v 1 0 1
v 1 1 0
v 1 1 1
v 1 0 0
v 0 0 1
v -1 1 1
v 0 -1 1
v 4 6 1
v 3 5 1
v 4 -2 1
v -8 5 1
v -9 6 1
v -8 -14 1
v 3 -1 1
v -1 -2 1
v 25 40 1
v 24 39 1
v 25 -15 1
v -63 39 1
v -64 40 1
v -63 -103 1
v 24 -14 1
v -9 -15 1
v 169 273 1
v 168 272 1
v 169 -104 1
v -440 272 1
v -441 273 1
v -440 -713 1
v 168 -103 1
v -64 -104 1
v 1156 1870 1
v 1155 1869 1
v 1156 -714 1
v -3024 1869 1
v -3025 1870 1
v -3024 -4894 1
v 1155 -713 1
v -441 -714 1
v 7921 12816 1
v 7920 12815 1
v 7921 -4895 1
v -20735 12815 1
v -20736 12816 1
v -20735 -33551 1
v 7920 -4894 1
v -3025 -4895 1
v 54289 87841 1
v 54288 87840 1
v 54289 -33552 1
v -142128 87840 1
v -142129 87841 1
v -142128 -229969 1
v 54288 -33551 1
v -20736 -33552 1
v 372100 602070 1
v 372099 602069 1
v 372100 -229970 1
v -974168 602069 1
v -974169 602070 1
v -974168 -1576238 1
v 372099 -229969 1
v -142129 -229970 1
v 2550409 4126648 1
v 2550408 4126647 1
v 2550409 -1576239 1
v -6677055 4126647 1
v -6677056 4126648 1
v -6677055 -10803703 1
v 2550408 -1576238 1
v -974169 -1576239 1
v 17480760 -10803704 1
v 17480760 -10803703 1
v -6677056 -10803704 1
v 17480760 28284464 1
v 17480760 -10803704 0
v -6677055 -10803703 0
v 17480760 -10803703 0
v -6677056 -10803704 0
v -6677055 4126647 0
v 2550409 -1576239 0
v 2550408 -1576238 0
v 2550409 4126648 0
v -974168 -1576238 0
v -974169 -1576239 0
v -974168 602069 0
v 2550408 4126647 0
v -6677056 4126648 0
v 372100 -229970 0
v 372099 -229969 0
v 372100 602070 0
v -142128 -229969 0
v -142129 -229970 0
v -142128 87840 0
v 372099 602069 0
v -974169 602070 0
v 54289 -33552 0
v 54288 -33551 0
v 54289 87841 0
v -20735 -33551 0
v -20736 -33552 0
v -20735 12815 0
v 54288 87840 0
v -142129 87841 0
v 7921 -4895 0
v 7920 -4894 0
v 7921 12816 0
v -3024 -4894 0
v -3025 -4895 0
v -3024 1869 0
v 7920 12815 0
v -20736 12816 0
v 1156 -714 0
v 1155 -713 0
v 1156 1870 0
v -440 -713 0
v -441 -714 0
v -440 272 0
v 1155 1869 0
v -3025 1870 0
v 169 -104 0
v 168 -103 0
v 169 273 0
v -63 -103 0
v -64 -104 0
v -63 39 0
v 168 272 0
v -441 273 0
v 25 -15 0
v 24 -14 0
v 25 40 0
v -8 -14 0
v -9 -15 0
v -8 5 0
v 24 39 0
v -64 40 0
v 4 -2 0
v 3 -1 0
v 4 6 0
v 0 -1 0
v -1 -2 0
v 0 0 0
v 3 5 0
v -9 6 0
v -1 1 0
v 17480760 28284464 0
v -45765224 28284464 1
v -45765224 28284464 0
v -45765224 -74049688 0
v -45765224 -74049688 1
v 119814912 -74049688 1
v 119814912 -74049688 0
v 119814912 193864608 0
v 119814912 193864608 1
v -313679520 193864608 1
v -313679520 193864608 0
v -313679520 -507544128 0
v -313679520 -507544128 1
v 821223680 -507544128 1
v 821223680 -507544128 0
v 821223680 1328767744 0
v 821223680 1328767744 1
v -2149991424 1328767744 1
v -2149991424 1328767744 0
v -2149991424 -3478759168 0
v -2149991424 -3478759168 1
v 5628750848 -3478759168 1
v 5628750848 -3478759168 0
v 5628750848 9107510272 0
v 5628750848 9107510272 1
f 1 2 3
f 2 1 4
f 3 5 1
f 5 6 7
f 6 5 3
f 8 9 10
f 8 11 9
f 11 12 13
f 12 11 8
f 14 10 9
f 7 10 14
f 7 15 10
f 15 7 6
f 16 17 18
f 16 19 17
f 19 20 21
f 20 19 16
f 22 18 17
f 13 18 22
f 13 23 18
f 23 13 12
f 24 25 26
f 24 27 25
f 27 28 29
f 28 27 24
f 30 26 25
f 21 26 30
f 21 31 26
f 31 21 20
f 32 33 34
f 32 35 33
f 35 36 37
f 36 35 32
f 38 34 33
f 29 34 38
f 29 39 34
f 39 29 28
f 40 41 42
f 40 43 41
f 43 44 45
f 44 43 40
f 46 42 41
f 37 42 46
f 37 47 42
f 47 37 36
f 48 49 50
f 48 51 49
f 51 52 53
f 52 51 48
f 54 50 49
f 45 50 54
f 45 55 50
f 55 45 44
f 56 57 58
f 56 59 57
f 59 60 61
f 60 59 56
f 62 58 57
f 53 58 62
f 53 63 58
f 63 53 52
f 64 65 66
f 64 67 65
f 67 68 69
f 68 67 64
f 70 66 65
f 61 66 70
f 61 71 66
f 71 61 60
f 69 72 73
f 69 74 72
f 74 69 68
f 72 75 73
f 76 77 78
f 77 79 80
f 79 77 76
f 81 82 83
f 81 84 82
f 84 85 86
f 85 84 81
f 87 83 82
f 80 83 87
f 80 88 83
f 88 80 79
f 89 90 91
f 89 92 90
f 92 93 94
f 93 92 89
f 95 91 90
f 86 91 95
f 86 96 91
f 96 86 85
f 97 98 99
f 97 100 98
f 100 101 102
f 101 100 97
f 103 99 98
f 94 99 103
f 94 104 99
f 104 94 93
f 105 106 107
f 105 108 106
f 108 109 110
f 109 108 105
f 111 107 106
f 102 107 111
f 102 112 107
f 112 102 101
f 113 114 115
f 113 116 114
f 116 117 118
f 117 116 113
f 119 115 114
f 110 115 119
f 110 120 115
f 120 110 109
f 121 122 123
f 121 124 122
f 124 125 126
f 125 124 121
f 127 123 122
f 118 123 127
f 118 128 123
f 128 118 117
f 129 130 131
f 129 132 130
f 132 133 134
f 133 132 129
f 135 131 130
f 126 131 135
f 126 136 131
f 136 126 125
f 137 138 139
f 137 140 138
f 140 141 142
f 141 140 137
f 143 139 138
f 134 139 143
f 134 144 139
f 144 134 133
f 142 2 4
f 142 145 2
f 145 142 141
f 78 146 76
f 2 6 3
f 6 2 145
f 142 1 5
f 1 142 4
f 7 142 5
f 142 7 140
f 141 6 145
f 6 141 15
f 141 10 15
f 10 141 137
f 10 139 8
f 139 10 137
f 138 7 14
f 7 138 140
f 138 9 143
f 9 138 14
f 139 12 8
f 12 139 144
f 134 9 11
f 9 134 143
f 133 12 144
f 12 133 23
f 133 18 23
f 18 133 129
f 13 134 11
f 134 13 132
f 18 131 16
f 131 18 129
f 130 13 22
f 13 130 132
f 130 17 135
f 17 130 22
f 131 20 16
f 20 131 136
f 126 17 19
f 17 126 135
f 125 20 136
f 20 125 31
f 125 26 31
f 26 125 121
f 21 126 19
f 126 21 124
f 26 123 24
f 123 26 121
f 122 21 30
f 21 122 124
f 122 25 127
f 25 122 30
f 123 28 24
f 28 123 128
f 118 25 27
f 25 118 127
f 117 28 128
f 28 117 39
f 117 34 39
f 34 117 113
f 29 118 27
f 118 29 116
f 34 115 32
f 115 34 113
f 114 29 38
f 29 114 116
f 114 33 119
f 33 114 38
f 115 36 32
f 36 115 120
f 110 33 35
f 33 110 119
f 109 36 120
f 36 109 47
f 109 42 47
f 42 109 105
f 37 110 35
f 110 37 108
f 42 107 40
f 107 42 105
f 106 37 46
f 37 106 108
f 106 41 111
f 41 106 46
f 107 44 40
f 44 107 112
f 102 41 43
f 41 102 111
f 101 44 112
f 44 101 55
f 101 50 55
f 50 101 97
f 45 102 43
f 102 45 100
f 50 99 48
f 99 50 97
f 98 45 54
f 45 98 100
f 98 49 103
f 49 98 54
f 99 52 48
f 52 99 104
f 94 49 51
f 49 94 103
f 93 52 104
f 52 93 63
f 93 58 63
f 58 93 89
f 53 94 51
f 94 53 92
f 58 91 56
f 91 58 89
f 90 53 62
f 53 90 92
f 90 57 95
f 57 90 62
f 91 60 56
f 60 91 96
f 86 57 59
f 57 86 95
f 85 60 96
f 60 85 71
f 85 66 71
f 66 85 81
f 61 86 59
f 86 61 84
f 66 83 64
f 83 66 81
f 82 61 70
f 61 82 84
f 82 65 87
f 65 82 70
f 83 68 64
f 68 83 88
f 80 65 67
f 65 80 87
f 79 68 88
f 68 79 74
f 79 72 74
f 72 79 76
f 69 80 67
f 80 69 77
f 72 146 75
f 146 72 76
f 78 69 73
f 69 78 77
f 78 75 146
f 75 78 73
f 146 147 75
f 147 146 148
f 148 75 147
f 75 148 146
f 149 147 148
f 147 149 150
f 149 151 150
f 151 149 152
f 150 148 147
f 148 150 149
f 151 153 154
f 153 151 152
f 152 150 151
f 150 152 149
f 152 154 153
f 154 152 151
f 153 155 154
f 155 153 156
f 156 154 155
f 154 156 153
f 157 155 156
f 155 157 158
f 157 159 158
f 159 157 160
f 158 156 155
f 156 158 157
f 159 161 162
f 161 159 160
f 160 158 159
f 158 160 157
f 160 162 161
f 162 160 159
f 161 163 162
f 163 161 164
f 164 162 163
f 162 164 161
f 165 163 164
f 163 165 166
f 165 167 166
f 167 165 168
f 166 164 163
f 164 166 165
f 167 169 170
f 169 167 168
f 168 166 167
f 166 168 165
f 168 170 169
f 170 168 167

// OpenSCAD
translate([0,0,0])rotate(0)cube([1,1,1]);
translate([1,0,0])rotate(90)cube([1,1,1]);
translate([1,1,0])rotate(180)cube([2,1,1]);
translate([-1,1,0])rotate(270)cube([3,1,1]);
translate([-1,-2,0])rotate(0)cube([5,1,1]);
translate([4,-2,0])rotate(90)cube([8,1,1]);
translate([4,6,0])rotate(180)cube([13,1,1]);
translate([-9,6,0])rotate(270)cube([21,1,1]);
translate([-9,-15,0])rotate(0)cube([34,1,1]);
translate([25,-15,0])rotate(90)cube([55,1,1]);
translate([25,40,0])rotate(180)cube([89,1,1]);
translate([-64,40,0])rotate(270)cube([144,1,1]);
translate([-64,-104,0])rotate(0)cube([233,1,1]);
translate([169,-104,0])rotate(90)cube([377,1,1]);
translate([169,273,0])rotate(180)cube([610,1,1]);
translate([-441,273,0])rotate(270)cube([987,1,1]);
translate([-441,-714,0])rotate(0)cube([1597,1,1]);
translate([1156,-714,0])rotate(90)cube([2584,1,1]);
translate([1156,1870,0])rotate(180)cube([4181,1,1]);
translate([-3025,1870,0])rotate(270)cube([6765,1,1]);
translate([-3025,-4895,0])rotate(0)cube([10946,1,1]);
translate([7921,-4895,0])rotate(90)cube([17711,1,1]);
translate([7921,12816,0])rotate(180)cube([28657,1,1]);
translate([-20736,12816,0])rotate(270)cube([46368,1,1]);
translate([-20736,-33552,0])rotate(0)cube([75025,1,1]);
translate([54289,-33552,0])rotate(90)cube([121393,1,1]);
translate([54289,87841,0])rotate(180)cube([196418,1,1]);
translate([-142129,87841,0])rotate(270)cube([317811,1,1]);
translate([-142129,-229970,0])rotate(0)cube([514229,1,1]);
translate([372100,-229970,0])rotate(90)cube([832040,1,1]);
translate([372100,602070,0])rotate(180)cube([1346269,1,1]);
translate([-974169,602070,0])rotate(270)cube([2178309,1,1]);
translate([-974169,-1576239,0])rotate(0)cube([3524578,1,1]);
translate([2550409,-1576239,0])rotate(90)cube([5702887,1,1]);
translate([2550409,4126648,0])rotate(180)cube([9227465,1,1]);
translate([-6677056,4126648,0])rotate(270)cube([14930352,1,1]);
translate([-6677056,-10803704,0])rotate(0)cube([24157817,1,1]);
translate([17480761,-10803704,0])rotate(90)cube([39088169,1,1]);
translate([17480761,28284465,0])rotate(180)cube([63245986,1,1]);
translate([-45765225,28284465,0])rotate(270)cube([102334155,1,1]);
translate([-45765225,-74049690,0])rotate(0)cube([165580141,1,1]);
translate([119814916,-74049690,0])rotate(90)cube([267914296,1,1]);
translate([119814916,193864606,0])rotate(180)cube([433494437,1,1]);
translate([-313679521,193864606,0])rotate(270)cube([701408733,1,1]);
translate([-313679521,-507544127,0])rotate(0)cube([1134903170,1,1]);
translate([821223649,-507544127,0])rotate(90)cube([1836311903,1,1]);
translate([821223649,1328767776,0])rotate(180)cube([2971215073,1,1]);
translate([-2149991424,1328767776,0])rotate(270)cube([4807526976,1,1]);
translate([-2149991424,-3478759200,0])rotate(0)cube([7778742049,1,1]);
translate([5628750625,-3478759200,0])rotate(90)cube([12586269025,1,1]);
